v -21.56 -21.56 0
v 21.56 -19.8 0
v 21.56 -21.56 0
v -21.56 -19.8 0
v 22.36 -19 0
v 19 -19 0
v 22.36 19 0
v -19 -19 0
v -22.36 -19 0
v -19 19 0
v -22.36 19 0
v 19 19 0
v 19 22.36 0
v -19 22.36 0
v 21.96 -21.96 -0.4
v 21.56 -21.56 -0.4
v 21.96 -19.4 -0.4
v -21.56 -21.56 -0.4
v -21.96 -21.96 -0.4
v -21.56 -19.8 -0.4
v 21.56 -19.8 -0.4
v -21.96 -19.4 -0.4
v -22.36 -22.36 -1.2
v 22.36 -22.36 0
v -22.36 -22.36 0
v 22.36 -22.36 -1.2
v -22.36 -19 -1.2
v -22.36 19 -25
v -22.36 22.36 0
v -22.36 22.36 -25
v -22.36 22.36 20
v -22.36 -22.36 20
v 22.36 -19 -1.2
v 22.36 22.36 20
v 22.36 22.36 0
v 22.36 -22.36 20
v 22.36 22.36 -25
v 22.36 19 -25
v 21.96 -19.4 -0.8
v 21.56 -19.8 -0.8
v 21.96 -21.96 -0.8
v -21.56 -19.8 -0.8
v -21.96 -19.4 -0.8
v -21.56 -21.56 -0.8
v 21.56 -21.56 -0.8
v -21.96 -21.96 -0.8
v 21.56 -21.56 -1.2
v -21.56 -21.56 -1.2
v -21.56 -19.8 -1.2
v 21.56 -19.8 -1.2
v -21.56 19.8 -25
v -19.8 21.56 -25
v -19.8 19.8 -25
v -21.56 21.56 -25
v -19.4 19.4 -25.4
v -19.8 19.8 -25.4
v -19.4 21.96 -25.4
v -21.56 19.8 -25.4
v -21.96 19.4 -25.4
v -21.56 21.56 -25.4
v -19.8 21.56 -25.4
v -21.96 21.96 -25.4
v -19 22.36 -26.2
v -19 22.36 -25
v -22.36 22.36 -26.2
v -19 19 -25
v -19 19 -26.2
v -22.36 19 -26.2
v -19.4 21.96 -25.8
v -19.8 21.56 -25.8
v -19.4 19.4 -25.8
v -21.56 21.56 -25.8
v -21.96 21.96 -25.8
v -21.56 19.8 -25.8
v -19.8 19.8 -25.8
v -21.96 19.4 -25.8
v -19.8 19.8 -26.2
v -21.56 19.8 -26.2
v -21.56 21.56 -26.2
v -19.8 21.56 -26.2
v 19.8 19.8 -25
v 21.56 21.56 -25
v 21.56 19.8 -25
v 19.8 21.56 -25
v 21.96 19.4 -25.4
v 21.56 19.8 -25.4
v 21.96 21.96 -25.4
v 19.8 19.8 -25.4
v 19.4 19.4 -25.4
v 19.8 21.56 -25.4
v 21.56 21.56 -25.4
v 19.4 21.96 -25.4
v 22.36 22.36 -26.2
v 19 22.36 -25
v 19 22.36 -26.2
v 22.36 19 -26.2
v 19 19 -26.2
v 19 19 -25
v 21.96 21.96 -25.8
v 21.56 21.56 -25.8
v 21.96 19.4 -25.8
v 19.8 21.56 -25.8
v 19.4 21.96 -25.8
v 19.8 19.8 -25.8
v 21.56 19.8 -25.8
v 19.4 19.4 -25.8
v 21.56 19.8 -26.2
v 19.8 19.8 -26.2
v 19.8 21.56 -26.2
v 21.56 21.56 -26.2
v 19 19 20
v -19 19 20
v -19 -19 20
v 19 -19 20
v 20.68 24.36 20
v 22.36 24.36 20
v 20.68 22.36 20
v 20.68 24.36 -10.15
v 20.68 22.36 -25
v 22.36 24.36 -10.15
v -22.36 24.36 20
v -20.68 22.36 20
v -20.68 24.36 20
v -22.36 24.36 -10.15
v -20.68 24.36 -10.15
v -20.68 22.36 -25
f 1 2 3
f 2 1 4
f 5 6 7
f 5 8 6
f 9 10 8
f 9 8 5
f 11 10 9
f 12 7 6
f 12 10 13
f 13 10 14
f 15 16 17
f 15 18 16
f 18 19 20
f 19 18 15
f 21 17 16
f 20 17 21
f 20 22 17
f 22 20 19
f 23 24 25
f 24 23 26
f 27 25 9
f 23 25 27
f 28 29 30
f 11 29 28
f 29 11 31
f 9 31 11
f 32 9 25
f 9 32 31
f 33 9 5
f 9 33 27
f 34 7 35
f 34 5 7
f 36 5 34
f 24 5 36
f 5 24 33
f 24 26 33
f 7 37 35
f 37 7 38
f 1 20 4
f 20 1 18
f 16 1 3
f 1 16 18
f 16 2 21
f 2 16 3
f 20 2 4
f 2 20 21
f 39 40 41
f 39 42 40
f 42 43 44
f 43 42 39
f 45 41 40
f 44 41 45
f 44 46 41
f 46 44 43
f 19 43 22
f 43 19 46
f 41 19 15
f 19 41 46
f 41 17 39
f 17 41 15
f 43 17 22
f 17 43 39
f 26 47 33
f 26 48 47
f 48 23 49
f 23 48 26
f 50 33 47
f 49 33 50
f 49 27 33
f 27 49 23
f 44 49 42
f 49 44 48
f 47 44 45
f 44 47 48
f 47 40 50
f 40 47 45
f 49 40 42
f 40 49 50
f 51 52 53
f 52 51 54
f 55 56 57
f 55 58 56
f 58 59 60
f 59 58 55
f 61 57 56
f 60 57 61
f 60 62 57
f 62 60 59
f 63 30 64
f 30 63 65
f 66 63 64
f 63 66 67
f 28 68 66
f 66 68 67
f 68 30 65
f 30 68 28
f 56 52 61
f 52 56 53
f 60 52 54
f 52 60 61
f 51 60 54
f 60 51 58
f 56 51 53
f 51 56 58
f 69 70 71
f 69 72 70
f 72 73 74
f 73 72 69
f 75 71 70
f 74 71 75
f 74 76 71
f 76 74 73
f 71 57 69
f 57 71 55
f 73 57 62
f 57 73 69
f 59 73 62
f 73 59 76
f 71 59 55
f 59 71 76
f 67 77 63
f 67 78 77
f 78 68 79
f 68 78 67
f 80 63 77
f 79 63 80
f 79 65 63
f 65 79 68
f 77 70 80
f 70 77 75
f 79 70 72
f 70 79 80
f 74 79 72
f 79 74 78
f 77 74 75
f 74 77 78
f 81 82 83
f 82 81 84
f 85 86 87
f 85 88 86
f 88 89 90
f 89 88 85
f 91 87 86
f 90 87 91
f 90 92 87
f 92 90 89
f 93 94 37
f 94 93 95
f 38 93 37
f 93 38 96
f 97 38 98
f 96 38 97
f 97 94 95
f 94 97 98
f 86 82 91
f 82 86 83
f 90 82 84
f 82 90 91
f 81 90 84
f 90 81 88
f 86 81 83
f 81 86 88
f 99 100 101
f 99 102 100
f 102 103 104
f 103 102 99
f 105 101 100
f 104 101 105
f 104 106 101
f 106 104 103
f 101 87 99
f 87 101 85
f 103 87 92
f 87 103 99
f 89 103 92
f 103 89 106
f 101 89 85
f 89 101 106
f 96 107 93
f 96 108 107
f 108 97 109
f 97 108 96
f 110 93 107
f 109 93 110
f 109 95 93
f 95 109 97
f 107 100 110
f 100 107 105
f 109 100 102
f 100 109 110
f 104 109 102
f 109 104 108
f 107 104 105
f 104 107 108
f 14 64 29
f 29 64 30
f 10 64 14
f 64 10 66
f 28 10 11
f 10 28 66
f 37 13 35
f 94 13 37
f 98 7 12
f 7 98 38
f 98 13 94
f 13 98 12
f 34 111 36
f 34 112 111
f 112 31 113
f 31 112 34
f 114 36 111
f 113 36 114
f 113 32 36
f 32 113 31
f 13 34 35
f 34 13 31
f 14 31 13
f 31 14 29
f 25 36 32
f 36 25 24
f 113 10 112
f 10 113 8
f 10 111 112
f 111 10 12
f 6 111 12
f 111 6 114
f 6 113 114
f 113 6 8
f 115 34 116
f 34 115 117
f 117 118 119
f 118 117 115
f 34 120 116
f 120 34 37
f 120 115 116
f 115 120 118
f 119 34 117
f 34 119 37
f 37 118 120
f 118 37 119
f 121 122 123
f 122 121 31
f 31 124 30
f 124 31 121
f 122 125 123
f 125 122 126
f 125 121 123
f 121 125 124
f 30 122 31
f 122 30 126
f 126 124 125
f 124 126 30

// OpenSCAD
// file: clip.scad
module clip_outer(clip_depth, width, breadth) { color("red") {
    assert(width > 4 * clip_depth, "width must be greater than 4 * clip_depth");
    assert(breadth > 4 * clip_depth, "breadth must be greater than 4 * clip_depth");

    linear_extrude(clip_depth) difference()  {
        square([width, breadth], true);
        square([width - 4 * clip_depth, breadth - 4 * clip_depth], true);
    }
    
    translate([0, 0, clip_depth]) linear_extrude(clip_depth) difference()  {
            square([width, breadth], true);
            square([width - 2 * clip_depth, breadth - 2 * clip_depth], true);
    }
    
    translate([0, 0, clip_depth * 2]) linear_extrude(clip_depth) difference()  {
        square([width, breadth], true);
        square([width - 4 * clip_depth, breadth - 4 * clip_depth], true);
    }
}}


module clip_inner(clip_depth, width, breadth) { color("green") {
    assert(width > 4 * clip_depth, "width must be greater than 4 * clip_depth");
    assert(breadth > 4 * clip_depth, "breadth must be greater than 4 * clip_depth");

    linear_extrude(clip_depth) 
        square([width, breadth], true);
    
    translate([0, 0, clip_depth]) linear_extrude(clip_depth) 
        square([width - 4 * clip_depth, breadth - 4 * clip_depth], true); 
        
    translate([0, 0, clip_depth * 2]) linear_extrude(clip_depth)
        square([width - 2 * clip_depth, breadth - 2 * clip_depth], true);
}}
// file: config.scad
$fn = $preview ? 32 : 128;
thread_fn = $preview ? 16 : 128;

blower_inner_radius = 41.7 / 2;
blower_lip_width = 9.5;
blower_lip_depth = 2.5;
blower_inset_depth = 2.5;
blower_inset_radius = 34 / 2;
blower_lip_thickness = 2;
blower_middle_depth = 2.5;
blower_outer_radius = 49 / 2;
blower_upper_depth = 5;

slide_length = 38;
slide_height = 25;
slide_thickness = 1.2;
slide_rails_height = 3;
slide_rails_depth = slide_rails_height / 2;
slide_mount_wall_thickness = slide_thickness * 2.8;
slide_mount_width = slide_length + slide_mount_wall_thickness * 2;
clip_depth = 0.4;
flue_slit_length = slide_mount_width * 0.75;
flue_taper_into_slit = 20; 
flue_floor_thickness = slide_mount_wall_thickness;
flue_slit_depth = 1;
flue_slit_offset = 5;
flue_upper_height = 20;
flue_lip_length = flue_upper_height + 15;
flue_lip_thickness = 2;
flue_lip_breadth = slide_mount_width - slide_mount_wall_thickness; 
flue_lip_rail_thickness = (slide_mount_width - flue_lip_breadth) / 2;

nut_depth = 2.3;
bolt_radius = 3 / 2;

pipe_outer_radius = 41 / 2;


window_post_width = 2;
window_post_height = slide_height + clip_depth;

thread_size = "M42";
thread_turns = 2;
thread_pitch = 4.5;
// main file
include <config.scad>

use <clip.scad>

module flue_posts() {
    wall_center = (slide_mount_width - slide_mount_wall_thickness) / 2;
    rotate([0, 180, 0]) linear_extrude(slide_height) translate([0, wall_center]) { 
        translate([ wall_center, 0]) square([slide_mount_wall_thickness, slide_mount_wall_thickness], true); 
        translate([-wall_center, 0]) square([slide_mount_wall_thickness, slide_mount_wall_thickness], true); 
    } 
    
    rotate([0, 180, 0]) translate([0, wall_center, slide_height]) { 
        translate([ wall_center, 0]) 
            clip_outer(clip_depth, slide_mount_wall_thickness, slide_mount_wall_thickness);
        translate([-wall_center, 0]) 
            clip_outer(clip_depth, slide_mount_wall_thickness, slide_mount_wall_thickness);
    }
}

module flue_rail() {
    length = slide_height + flue_upper_height;
    linear_extrude(flue_lip_rail_thickness) polygon(points = [
        [0, 0],
        [0, flue_lip_thickness],
        [length * 0.67, flue_lip_thickness],
        [length, 0]
    ]); 
}

module flue_upper() {
    linear_extrude(flue_upper_height) difference() {
        square([slide_mount_width, slide_mount_width], true);
        square([slide_mount_width - 2 * slide_mount_wall_thickness, slide_mount_width - 2 * slide_mount_wall_thickness], true);
    }

    translate([0, -(slide_mount_width - slide_mount_wall_thickness) / 2]) rotate([180, 0, 0])
        clip_outer(clip_depth, slide_mount_width, slide_mount_wall_thickness);

    flue_posts();
    
    translate([slide_mount_width / 2 - flue_lip_rail_thickness, slide_mount_width / 2, flue_upper_height]) rotate([0, 90, 0]) 
        flue_rail();
    translate([-slide_mount_width / 2, slide_mount_width / 2, flue_upper_height]) rotate([0, 90, 0]) 
        flue_rail();
}

flue_upper();
